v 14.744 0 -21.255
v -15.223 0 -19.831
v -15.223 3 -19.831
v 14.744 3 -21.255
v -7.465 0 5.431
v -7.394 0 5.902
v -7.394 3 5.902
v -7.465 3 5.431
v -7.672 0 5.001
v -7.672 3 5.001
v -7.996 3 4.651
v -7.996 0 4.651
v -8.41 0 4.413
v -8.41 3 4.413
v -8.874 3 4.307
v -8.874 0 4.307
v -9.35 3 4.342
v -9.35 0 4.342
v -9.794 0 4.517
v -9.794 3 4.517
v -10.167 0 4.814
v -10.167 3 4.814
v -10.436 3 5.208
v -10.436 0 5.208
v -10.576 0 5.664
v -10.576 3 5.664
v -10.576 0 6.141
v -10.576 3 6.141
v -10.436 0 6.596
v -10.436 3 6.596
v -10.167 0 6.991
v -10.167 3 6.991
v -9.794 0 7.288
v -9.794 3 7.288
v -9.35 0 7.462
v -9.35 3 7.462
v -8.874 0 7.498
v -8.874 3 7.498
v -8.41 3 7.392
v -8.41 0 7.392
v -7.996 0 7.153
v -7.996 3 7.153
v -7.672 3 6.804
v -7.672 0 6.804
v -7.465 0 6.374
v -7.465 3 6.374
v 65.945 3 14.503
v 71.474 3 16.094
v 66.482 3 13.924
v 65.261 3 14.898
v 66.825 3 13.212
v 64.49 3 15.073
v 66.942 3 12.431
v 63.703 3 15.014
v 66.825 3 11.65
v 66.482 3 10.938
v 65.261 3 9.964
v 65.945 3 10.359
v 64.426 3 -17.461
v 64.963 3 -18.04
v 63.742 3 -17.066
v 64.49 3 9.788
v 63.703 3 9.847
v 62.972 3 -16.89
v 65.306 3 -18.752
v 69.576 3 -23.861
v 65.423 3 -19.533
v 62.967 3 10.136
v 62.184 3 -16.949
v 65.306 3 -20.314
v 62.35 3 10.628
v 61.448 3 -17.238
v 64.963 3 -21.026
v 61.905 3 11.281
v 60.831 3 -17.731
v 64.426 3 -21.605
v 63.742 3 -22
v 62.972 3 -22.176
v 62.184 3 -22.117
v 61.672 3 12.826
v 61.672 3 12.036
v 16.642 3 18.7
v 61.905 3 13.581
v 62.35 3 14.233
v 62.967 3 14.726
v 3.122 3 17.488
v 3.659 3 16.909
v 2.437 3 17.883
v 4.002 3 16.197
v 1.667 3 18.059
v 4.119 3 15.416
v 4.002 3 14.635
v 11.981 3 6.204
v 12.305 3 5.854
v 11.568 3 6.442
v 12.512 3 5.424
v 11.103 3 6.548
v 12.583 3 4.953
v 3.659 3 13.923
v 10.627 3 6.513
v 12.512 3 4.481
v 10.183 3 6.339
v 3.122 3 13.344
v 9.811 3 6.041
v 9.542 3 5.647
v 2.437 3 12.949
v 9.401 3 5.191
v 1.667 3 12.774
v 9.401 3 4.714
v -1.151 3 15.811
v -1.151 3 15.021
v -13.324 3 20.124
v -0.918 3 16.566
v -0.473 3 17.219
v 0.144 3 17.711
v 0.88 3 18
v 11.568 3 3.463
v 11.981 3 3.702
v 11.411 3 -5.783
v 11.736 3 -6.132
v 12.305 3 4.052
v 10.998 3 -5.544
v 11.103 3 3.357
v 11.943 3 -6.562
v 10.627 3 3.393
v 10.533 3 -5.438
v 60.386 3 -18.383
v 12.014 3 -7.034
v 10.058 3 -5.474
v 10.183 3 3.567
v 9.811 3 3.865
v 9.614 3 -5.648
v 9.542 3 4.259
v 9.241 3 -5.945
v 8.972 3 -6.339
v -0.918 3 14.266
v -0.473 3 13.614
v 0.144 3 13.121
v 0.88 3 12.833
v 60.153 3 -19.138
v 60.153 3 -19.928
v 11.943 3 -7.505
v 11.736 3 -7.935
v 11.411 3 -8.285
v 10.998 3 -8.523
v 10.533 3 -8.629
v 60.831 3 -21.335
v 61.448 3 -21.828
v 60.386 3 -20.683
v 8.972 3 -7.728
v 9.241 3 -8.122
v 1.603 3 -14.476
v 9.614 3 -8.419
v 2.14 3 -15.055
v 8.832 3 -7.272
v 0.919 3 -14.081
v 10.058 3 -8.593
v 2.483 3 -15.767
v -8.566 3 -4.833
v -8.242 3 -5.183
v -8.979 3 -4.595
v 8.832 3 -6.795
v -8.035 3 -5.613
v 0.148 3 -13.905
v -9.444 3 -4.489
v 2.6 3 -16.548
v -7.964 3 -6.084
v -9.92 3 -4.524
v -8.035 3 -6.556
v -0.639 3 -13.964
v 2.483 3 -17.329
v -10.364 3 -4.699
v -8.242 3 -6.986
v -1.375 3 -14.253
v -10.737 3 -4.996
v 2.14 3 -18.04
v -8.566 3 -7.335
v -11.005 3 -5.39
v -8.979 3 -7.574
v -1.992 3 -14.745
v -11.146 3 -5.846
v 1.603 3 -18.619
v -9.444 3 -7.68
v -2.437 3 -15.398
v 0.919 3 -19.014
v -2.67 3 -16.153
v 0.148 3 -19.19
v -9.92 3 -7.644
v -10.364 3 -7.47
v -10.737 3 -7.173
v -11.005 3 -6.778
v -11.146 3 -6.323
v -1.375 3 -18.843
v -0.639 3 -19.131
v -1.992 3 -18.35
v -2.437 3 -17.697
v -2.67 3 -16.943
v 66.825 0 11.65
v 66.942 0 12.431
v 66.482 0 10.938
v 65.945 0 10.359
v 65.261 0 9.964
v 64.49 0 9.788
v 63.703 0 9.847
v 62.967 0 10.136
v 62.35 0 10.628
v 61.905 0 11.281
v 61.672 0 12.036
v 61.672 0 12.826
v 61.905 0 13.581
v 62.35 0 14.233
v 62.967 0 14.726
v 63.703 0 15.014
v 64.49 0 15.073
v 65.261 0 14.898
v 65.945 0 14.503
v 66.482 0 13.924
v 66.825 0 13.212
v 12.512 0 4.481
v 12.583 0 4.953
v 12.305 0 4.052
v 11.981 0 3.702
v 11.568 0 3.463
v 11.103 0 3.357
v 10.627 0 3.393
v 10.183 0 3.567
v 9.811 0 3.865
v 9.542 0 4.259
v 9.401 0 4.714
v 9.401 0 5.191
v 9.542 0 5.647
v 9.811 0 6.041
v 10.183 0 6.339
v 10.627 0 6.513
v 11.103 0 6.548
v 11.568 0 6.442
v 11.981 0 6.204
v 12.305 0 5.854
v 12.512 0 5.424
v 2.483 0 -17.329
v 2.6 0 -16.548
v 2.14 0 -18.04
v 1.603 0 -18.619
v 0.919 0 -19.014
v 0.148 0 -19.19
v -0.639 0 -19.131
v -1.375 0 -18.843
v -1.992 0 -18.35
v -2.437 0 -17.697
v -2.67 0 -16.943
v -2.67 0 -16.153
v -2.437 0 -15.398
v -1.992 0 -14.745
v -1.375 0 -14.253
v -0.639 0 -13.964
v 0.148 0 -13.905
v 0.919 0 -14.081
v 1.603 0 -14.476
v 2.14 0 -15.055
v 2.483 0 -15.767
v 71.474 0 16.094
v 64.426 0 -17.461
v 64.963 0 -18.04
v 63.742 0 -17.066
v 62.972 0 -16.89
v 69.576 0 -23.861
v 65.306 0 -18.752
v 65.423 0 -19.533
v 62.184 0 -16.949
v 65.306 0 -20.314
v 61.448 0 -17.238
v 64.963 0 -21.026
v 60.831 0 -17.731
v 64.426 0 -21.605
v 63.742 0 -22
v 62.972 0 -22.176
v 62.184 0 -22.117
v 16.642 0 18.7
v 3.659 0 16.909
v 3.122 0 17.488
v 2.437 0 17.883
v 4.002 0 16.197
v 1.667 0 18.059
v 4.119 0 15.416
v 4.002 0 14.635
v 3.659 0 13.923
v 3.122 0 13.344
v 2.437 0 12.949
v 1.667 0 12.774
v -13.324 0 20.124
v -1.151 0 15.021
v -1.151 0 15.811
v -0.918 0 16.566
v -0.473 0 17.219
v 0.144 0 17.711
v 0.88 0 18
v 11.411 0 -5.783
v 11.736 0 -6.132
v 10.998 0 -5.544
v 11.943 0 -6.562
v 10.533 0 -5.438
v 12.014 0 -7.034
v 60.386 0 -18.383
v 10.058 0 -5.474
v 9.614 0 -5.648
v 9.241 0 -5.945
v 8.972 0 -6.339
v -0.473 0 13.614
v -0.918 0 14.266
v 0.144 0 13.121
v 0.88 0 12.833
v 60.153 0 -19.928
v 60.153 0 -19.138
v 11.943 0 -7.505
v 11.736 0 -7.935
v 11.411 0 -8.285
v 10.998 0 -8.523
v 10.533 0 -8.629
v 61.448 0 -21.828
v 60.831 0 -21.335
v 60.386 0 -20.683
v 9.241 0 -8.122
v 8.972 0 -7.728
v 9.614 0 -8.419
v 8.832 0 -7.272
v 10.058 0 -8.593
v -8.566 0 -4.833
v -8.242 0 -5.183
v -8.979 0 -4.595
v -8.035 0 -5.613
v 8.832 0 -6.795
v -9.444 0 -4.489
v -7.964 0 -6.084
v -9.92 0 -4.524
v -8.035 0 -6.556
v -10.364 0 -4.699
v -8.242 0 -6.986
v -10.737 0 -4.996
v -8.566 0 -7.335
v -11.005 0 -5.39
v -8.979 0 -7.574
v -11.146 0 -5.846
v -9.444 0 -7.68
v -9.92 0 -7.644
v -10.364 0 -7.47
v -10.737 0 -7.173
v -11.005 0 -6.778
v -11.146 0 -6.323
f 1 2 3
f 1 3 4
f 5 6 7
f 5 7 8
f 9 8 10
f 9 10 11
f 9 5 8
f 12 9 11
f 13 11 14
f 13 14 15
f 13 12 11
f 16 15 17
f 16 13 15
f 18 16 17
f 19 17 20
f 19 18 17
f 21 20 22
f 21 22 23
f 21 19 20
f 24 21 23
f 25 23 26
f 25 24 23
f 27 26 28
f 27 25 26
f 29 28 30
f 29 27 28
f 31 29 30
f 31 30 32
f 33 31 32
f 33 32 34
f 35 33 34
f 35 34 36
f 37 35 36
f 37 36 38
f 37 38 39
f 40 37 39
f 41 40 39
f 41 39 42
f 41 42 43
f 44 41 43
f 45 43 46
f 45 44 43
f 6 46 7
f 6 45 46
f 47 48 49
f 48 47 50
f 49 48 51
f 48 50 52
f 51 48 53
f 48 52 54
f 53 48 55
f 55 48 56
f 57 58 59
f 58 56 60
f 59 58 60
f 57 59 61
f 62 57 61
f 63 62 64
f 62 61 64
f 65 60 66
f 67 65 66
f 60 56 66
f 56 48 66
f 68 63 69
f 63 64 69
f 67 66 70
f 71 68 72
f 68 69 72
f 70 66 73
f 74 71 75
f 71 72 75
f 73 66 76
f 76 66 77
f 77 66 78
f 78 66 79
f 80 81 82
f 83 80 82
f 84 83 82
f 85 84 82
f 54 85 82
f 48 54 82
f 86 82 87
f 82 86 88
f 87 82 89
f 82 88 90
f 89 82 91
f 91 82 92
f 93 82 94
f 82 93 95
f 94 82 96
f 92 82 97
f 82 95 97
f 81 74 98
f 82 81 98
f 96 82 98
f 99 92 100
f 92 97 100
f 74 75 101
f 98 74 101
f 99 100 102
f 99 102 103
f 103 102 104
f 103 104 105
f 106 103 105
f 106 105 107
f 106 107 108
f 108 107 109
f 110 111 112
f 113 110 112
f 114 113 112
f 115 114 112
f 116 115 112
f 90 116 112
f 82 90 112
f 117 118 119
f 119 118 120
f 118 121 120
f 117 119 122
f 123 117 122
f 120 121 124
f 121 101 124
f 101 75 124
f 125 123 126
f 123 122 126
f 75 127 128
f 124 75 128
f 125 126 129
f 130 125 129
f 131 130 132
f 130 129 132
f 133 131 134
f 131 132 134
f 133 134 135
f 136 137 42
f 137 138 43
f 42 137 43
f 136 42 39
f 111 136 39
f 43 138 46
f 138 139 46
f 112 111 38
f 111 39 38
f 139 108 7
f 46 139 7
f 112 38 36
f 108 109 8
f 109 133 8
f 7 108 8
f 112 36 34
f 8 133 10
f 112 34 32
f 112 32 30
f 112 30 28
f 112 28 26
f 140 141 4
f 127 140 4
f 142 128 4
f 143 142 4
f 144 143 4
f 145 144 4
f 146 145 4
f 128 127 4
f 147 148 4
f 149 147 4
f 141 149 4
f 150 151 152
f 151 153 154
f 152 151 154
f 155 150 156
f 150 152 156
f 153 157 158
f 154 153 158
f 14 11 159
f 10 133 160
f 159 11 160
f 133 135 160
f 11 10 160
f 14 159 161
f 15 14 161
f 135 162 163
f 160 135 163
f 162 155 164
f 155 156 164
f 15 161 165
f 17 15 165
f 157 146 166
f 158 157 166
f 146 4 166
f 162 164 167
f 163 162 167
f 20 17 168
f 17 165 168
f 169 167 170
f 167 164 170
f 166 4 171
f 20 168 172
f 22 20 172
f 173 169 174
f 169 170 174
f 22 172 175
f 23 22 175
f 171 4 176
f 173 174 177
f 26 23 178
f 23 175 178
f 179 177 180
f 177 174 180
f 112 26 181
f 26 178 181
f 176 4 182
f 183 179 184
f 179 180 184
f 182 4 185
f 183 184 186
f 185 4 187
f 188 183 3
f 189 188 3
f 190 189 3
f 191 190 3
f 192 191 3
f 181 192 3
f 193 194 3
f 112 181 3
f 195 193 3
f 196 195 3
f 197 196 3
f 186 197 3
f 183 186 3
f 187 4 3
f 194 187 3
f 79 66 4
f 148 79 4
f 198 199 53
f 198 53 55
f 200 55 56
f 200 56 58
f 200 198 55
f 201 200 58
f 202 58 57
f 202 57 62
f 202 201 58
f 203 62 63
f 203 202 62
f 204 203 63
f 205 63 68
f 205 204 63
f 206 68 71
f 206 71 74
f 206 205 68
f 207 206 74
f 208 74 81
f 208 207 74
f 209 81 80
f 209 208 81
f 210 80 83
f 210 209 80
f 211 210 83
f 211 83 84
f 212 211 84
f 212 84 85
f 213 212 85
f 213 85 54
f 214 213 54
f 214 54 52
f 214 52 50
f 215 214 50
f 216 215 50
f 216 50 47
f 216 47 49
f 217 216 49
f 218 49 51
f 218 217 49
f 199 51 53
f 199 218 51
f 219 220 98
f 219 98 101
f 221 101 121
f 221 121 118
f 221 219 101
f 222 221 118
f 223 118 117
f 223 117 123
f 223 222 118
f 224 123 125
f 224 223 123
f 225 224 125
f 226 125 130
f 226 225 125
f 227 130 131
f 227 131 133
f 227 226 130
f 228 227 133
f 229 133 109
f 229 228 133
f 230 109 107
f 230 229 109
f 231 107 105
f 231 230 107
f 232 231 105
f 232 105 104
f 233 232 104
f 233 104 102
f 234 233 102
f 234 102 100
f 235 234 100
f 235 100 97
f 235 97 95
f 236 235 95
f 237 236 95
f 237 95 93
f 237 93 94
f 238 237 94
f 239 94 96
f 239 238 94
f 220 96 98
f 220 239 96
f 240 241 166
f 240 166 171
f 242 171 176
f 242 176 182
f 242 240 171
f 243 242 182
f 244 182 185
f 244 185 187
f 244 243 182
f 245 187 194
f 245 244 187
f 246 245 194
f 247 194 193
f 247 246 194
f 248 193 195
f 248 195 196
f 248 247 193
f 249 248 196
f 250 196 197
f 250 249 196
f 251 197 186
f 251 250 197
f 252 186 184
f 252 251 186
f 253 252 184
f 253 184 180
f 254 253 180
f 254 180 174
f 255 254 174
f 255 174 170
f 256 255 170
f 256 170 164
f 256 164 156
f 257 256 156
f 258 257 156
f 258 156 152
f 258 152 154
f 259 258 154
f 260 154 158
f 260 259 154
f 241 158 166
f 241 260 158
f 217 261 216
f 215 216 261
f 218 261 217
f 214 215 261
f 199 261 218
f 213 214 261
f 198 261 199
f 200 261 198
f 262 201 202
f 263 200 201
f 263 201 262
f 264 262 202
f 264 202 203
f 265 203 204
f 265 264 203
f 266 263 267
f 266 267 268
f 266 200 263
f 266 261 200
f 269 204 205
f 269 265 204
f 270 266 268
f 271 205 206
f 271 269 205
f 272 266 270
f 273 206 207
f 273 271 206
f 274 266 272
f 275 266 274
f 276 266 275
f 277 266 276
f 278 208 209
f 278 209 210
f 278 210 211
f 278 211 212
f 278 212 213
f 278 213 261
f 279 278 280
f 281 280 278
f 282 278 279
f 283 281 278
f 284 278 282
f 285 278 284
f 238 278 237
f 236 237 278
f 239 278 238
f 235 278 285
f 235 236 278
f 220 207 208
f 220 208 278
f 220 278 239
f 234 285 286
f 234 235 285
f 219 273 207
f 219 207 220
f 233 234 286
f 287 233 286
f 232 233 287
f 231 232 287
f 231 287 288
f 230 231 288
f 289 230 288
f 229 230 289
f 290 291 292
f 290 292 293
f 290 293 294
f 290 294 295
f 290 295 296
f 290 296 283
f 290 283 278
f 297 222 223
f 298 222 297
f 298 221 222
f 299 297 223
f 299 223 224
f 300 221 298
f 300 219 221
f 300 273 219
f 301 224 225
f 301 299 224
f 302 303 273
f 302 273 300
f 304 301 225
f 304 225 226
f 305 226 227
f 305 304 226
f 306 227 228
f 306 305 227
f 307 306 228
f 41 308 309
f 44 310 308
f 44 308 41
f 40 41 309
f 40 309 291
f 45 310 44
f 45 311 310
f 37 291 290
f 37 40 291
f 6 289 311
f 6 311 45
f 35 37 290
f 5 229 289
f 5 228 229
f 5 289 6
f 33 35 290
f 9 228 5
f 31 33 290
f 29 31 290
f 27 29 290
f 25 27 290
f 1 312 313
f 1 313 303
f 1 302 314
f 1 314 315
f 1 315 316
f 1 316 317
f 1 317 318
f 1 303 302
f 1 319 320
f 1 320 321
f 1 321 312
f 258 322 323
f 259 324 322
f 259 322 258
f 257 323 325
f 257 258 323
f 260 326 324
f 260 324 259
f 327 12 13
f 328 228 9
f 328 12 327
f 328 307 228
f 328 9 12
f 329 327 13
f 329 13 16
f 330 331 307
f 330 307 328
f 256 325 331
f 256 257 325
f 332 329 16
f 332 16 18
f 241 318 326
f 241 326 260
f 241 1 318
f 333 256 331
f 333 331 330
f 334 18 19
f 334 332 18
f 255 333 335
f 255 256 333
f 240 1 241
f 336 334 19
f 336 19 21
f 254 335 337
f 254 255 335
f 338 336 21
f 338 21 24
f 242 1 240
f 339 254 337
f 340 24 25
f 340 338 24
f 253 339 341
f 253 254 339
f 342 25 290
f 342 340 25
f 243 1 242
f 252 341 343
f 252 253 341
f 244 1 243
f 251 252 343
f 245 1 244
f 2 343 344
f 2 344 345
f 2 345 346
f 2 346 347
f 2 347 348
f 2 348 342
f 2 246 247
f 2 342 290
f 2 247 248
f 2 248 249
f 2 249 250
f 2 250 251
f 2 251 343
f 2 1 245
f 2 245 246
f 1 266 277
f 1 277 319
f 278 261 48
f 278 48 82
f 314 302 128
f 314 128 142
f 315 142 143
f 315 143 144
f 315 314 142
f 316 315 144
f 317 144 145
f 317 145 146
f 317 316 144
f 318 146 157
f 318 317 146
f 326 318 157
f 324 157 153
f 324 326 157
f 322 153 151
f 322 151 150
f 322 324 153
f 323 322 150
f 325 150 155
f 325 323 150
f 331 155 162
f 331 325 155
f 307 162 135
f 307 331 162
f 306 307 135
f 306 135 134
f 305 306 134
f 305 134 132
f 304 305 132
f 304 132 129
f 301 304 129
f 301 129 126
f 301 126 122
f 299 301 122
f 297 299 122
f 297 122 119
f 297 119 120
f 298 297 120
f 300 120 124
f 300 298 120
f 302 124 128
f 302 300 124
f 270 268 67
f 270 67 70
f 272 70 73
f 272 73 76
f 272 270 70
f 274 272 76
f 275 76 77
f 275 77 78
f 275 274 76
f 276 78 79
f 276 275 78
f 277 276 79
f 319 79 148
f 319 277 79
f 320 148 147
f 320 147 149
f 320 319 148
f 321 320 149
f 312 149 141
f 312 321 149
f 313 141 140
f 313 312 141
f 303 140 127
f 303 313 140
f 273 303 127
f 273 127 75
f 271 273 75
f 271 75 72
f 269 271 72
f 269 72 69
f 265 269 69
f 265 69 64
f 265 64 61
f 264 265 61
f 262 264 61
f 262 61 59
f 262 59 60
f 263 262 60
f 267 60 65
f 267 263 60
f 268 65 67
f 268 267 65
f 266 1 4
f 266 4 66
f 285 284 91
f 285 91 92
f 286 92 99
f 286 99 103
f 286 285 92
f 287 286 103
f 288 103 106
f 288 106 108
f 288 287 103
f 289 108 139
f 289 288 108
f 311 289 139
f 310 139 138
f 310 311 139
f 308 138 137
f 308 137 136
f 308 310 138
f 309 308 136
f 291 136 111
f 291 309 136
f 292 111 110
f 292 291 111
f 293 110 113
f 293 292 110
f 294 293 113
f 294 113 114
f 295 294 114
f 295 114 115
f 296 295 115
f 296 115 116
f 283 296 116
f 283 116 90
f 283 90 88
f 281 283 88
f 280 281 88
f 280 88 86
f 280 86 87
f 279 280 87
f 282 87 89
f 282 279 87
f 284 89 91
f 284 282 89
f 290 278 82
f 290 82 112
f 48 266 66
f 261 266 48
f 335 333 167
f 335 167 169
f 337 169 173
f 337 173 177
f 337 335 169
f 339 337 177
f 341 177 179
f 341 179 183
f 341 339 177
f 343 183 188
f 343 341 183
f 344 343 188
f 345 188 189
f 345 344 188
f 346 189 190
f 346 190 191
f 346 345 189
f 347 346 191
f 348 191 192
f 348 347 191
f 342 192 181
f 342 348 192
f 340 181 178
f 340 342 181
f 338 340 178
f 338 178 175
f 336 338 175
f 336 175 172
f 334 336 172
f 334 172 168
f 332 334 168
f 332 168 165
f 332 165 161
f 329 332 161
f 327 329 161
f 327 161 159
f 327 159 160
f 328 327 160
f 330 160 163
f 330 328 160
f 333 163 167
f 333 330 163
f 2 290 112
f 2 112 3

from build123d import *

# Parameters (mm, degrees)
SKETCH_1_R      = 2.65
SKETCH_1_R_2    = 1.6
EXTRUDE_1_DEPTH = 3


with BuildPart() as part:
    # 草图1 → 凸台-拉伸1 (new body)
    with BuildSketch(Plane(origin=(0, 0, 0), x_dir=(1, 0, 0), z_dir=(0, 1, 0))):
        Polygon((-15.222569187, 19.831121687), (14.743614759, 21.25513704), (69.57570845, 23.860798923), (71.474395588, -16.094113005), (16.642301897, -18.699774888), (-13.323882049, -20.123790241), align=None)
        with Locations((-0.0496085, 16.547638171)):
            Circle(SKETCH_1_R, mode=Mode.SUBTRACT)
        with Locations((1.46934121, -15.416291372)):
            Circle(SKETCH_1_R, mode=Mode.SUBTRACT)
        with Locations((-8.994058556, -5.902235174)):
            Circle(SKETCH_1_R_2, mode=Mode.SUBTRACT)
        with Locations((-9.563664698, 6.084238404)):
            Circle(SKETCH_1_R_2, mode=Mode.SUBTRACT)
        with Locations((10.413791266, 7.033581973)):
            Circle(SKETCH_1_R_2, mode=Mode.SUBTRACT)
        with Locations((10.983397408, -4.952891605)):
            Circle(SKETCH_1_R_2, mode=Mode.SUBTRACT)
        with Locations((62.773467577, 19.533037481)):
            Circle(SKETCH_1_R, mode=Mode.SUBTRACT)
        with Locations((64.292417287, -12.430892061)):
            Circle(SKETCH_1_R, mode=Mode.SUBTRACT)
    extrude(amount=EXTRUDE_1_DEPTH)


solid = part.part
